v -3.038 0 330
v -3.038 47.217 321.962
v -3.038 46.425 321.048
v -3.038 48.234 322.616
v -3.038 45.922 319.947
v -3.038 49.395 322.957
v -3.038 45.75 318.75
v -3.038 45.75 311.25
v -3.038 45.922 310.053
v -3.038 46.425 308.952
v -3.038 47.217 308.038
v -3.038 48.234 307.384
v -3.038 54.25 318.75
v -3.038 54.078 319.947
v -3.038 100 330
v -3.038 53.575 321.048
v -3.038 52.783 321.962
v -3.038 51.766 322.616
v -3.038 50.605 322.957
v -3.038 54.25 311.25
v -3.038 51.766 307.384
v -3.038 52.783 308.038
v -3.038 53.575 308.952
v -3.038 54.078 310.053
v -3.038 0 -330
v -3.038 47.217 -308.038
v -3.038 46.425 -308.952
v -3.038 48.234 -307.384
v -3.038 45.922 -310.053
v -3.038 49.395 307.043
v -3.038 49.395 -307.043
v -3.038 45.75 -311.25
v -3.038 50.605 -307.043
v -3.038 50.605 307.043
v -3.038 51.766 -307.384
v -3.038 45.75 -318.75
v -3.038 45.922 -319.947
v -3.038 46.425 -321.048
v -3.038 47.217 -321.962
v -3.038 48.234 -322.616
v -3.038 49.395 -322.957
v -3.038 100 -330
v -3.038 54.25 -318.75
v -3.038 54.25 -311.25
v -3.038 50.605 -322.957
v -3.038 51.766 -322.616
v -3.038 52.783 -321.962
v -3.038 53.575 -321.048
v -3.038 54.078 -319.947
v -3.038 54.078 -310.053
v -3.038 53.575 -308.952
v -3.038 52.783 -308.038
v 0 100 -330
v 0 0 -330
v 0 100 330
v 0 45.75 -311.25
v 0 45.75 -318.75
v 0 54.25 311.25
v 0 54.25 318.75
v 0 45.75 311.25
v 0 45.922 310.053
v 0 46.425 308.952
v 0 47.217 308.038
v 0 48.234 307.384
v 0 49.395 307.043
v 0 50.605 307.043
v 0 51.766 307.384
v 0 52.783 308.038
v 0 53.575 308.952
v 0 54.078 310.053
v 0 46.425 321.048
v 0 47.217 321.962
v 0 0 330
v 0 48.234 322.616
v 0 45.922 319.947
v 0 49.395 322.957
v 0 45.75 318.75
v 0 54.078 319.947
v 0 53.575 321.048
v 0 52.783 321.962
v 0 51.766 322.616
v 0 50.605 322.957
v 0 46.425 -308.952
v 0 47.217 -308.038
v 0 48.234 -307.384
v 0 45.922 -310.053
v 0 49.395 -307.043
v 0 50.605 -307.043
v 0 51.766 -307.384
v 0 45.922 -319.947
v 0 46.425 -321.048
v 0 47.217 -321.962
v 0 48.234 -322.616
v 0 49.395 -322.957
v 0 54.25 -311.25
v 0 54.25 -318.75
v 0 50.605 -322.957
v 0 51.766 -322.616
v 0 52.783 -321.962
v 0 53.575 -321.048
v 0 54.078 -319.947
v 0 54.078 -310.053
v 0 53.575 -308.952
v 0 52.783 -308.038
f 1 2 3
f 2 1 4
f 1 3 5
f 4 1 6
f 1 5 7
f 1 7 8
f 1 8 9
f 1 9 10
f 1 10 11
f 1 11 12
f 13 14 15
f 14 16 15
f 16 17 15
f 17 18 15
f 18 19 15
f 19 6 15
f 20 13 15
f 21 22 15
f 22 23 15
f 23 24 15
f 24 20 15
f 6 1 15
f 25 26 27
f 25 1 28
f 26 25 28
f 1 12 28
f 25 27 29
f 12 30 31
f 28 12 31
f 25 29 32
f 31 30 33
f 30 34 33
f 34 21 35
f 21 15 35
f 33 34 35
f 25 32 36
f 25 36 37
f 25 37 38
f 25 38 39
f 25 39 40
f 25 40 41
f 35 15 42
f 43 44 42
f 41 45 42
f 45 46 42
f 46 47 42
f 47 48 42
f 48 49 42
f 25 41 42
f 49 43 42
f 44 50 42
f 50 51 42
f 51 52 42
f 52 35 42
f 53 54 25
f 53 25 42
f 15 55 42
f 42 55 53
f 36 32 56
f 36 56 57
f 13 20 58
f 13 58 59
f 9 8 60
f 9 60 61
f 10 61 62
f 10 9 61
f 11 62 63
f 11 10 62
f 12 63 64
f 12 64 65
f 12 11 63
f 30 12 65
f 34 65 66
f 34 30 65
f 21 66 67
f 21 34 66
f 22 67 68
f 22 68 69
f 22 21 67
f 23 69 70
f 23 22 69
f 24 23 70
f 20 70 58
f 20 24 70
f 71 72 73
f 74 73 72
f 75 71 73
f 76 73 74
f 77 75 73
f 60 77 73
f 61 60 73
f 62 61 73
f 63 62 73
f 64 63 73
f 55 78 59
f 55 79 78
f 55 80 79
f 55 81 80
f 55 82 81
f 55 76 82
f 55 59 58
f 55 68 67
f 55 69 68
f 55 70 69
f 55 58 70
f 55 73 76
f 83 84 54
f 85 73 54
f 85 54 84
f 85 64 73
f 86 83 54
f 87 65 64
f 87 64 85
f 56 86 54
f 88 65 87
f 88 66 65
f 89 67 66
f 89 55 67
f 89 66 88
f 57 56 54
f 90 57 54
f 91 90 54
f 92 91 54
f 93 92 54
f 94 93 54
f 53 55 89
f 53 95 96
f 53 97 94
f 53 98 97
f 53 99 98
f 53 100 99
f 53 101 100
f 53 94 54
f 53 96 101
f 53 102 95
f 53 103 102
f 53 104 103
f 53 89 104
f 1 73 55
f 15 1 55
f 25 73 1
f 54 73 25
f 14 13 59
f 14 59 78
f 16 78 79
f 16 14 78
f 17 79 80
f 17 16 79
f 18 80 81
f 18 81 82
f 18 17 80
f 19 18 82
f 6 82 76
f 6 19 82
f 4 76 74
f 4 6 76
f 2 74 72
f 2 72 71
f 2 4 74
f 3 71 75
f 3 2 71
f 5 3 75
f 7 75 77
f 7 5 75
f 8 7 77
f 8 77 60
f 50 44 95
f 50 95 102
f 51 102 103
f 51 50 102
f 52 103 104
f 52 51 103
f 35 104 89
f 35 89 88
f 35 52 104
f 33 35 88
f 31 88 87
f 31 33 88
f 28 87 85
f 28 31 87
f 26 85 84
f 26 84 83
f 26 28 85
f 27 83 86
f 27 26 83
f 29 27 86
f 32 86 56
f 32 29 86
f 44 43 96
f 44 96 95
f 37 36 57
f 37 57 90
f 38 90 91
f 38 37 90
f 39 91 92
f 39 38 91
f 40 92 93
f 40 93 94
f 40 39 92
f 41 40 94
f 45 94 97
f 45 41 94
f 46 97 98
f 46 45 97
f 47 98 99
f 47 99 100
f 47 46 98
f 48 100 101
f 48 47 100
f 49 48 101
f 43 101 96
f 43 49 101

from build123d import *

# Parameters (mm, degrees)
SKETCH1_W                = 660
SKETCH1_H                = 100
BASE_FLANGE1_DEPTH       = 3.03784
M6_START                 = -3.03784
M6_CLEARANCE_SLOT1_DEPTH = 3.03784


# Read off the part's stored shape, not the designer's step: M6 Clearance Slot1
# Sheet-metal steps are written as plain solids
with BuildPart() as part:
    # Sketch1 → Base-Flange1 (new body)
    with BuildSketch(Plane(origin=(0, 0, 0), x_dir=(0, 0, -1), z_dir=(1, 0, 0))):
        with Locations((0, 50)):
            Rectangle(SKETCH1_W, SKETCH1_H)
    extrude(amount=-BASE_FLANGE1_DEPTH)

    # M6 Clearance Slot1 outline → M6 Clearance Slot1 (cut)
    with BuildSketch(Plane.YZ.offset(M6_START)):
        with BuildLine():
            Line((54.25, -318.75), (54.25, -311.25))
            ThreePointArc((54.25, -311.25), (50, -307), (45.75, -311.25))
            Line((45.75, -311.25), (45.75, -318.75))
            ThreePointArc((45.75, -318.75), (50, -323), (54.25, -318.75))
        make_face()
        with BuildLine():
            ThreePointArc((54.25, 318.75), (50, 323), (45.75, 318.75))
            Line((45.75, 318.75), (45.75, 311.25))
            ThreePointArc((45.75, 311.25), (50, 307), (54.25, 311.25))
            Line((54.25, 311.25), (54.25, 318.75))
        make_face()
    extrude(amount=M6_CLEARANCE_SLOT1_DEPTH, mode=Mode.SUBTRACT)


solid = part.part
